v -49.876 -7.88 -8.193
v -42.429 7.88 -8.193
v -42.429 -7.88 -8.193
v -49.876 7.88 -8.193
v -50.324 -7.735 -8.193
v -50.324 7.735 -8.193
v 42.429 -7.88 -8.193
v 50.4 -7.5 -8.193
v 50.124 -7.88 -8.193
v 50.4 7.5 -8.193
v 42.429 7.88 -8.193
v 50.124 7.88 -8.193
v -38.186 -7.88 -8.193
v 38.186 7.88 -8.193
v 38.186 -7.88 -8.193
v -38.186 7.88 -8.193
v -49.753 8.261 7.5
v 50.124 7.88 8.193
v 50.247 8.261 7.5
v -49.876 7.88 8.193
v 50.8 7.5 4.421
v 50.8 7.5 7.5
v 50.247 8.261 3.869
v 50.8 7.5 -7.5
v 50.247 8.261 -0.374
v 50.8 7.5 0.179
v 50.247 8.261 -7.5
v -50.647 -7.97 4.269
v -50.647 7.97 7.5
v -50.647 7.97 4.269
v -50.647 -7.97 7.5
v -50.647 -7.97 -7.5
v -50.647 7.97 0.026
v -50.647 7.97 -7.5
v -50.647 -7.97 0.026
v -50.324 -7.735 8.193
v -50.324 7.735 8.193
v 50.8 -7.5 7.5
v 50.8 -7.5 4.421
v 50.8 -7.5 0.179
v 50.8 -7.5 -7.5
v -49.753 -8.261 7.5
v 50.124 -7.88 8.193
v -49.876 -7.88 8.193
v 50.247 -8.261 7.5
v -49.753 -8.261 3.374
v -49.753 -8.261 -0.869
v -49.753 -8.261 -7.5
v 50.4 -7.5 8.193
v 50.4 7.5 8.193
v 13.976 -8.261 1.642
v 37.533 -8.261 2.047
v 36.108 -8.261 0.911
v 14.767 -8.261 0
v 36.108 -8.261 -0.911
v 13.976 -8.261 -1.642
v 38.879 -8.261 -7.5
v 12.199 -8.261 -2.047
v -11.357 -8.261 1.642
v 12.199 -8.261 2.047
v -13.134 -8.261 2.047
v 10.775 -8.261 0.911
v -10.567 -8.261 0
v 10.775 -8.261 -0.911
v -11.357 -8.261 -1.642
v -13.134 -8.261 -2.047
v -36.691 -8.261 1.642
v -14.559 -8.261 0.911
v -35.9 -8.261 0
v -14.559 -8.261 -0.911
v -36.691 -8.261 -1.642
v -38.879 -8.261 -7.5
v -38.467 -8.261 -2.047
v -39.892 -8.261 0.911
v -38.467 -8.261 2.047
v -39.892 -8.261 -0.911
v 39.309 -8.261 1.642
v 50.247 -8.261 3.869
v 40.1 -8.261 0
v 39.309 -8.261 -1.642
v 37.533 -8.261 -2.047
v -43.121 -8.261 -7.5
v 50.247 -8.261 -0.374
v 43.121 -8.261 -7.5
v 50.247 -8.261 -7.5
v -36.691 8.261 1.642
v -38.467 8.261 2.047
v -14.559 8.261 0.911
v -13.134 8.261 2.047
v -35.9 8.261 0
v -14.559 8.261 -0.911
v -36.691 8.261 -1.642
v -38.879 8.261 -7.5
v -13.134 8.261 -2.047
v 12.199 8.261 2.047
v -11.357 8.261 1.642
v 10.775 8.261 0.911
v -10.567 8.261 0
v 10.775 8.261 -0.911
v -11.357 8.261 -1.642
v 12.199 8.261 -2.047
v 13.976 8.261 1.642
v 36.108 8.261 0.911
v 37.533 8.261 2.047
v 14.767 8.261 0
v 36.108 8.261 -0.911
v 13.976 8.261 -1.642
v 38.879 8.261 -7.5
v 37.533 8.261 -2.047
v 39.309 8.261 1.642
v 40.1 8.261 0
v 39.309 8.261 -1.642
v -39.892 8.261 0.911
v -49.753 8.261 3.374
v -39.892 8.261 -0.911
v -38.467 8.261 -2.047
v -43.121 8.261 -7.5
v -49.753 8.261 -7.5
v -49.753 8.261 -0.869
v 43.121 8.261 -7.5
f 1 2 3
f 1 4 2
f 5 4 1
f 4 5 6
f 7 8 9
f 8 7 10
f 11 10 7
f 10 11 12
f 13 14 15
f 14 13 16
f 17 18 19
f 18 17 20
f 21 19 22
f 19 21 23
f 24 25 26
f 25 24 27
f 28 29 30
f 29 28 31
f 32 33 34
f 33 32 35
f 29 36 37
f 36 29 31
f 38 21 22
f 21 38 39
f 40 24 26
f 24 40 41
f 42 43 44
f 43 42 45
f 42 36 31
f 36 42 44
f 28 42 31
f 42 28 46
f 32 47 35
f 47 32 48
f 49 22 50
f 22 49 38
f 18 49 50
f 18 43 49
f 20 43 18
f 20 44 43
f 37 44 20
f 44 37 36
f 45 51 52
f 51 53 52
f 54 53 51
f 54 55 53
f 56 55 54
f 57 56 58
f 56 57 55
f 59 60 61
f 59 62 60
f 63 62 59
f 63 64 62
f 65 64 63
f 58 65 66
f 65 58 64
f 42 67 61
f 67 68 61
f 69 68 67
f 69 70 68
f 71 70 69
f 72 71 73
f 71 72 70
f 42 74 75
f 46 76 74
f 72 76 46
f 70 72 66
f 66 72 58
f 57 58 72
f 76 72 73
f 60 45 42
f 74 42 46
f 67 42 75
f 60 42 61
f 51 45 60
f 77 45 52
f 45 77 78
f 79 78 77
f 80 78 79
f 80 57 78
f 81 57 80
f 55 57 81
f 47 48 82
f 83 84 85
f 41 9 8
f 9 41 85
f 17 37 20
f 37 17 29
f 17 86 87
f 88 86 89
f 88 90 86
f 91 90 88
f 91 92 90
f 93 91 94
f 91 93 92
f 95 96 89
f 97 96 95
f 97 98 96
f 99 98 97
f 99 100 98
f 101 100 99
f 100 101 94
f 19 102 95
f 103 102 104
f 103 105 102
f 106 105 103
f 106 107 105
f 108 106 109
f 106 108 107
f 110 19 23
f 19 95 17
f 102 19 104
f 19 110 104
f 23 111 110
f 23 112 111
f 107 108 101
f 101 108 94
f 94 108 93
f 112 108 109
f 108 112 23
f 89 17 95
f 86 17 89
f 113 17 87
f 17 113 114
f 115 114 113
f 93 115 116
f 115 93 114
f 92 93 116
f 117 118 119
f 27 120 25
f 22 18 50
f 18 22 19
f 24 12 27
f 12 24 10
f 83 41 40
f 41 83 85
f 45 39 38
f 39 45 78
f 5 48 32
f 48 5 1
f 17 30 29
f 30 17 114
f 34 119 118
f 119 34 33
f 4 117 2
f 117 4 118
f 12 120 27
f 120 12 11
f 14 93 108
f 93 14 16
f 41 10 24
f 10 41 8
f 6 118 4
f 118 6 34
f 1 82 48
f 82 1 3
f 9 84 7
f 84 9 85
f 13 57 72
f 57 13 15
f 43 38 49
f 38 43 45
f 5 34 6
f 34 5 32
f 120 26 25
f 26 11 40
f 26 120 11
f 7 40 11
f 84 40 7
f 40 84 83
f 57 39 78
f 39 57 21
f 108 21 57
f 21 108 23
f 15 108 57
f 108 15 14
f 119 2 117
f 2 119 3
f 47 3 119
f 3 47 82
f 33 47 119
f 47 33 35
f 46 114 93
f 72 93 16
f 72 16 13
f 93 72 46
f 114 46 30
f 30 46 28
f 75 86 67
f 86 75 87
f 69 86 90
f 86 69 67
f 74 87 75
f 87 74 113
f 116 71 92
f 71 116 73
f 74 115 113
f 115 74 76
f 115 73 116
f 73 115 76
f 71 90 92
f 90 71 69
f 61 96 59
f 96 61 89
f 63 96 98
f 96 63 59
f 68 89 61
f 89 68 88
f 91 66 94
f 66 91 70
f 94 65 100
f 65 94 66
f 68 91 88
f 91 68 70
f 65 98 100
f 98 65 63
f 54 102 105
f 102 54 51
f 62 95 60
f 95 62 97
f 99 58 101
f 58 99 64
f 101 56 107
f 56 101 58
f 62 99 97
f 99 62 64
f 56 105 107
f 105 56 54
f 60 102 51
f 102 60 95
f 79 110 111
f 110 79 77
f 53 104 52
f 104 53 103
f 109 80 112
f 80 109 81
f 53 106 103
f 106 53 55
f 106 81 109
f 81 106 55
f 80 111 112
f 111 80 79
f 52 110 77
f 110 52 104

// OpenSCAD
// Parameters
rail_L = 100.0; //[50.0:200.0:1]
rail_W = 15.0; //[7.5:30.0:0.5]
rail_H = 15.0; //[7.5:30.0:0.5]
hole_d = 4.2; //[2.0:8.0:0.1]
hole_count = 4; //[2:8:1]
end_margin = 12.0; //[6.0:24.0:0.5]
chamfer_L = 1.5; //[0.5:4.0:0.1]
fillet_r = 0.8; //[0.2:2.5:0.1]
overlap = 1.0; //[0.5:2.0:0.1]

// Rail Body with Edge Fillets
module rail_body_raw() {
  cube([rail_L, rail_W, rail_H], center=true);
}

module fillet_sphere() {
  sphere(r=fillet_r, center=true);
}

module edge_fillets() {
  minkowski() {
    rail_body_raw();
    fillet_sphere();
  }
}

// End Chamfers
module chamfer_cut_pos() {
  translate([rail_L/2 - chamfer_L, 0, 0])
  rotate([0, 45, 0])
  cube([chamfer_L*2, rail_W*2, rail_H*2], center=true);
}

module chamfer_cut_neg() {
  translate([-rail_L/2 + chamfer_L, 0, 0])
  rotate([0, -45, 0])
  cube([chamfer_L*2, rail_W*2, rail_H*2], center=true);
}

module end_chamfers() {
  difference() {
    edge_fillets();
    chamfer_cut_pos();
    chamfer_cut_neg();
  }
}

// Mounting Holes
module mount_hole_1() {
  translate([-rail_L/2 + end_margin, 0, 0])
  rotate([90, 0, 0])
  cylinder(r=hole_d/2, h=rail_H + overlap*2, center=true);
}

module mount_hole_2() {
  translate([-rail_L/2 + end_margin + (rail_L - 2*end_margin)/3, 0, 0])
  rotate([90, 0, 0])
  cylinder(r=hole_d/2, h=rail_H + overlap*2, center=true);
}

module mount_hole_3() {
  translate([-rail_L/2 + end_margin + 2*(rail_L - 2*end_margin)/3, 0, 0])
  rotate([90, 0, 0])
  cylinder(r=hole_d/2, h=rail_H + overlap*2, center=true);
}

module mount_hole_4() {
  translate([rail_L/2 - end_margin, 0, 0])
  rotate([90, 0, 0])
  cylinder(r=hole_d/2, h=rail_H + overlap*2, center=true);
}

module mounting_holes() {
  union() {
    mount_hole_1();
    mount_hole_2();
    mount_hole_3();
    mount_hole_4();
  }
}

// Rail Body with Holes
module rail_body() {
  difference() {
    end_chamfers();
    mounting_holes();
  }
}

// Engraved Markings Placeholder
module engraved_markings_placeholder() {
  translate([0, 0, rail_H/2 - rail_H*0.01])
  cube([rail_L*0.2, rail_W*0.2, rail_H*0.02], center=true);
}

// Complete Model
module complete_model() {
  rail_body();
}

// Final Output
complete_model();
